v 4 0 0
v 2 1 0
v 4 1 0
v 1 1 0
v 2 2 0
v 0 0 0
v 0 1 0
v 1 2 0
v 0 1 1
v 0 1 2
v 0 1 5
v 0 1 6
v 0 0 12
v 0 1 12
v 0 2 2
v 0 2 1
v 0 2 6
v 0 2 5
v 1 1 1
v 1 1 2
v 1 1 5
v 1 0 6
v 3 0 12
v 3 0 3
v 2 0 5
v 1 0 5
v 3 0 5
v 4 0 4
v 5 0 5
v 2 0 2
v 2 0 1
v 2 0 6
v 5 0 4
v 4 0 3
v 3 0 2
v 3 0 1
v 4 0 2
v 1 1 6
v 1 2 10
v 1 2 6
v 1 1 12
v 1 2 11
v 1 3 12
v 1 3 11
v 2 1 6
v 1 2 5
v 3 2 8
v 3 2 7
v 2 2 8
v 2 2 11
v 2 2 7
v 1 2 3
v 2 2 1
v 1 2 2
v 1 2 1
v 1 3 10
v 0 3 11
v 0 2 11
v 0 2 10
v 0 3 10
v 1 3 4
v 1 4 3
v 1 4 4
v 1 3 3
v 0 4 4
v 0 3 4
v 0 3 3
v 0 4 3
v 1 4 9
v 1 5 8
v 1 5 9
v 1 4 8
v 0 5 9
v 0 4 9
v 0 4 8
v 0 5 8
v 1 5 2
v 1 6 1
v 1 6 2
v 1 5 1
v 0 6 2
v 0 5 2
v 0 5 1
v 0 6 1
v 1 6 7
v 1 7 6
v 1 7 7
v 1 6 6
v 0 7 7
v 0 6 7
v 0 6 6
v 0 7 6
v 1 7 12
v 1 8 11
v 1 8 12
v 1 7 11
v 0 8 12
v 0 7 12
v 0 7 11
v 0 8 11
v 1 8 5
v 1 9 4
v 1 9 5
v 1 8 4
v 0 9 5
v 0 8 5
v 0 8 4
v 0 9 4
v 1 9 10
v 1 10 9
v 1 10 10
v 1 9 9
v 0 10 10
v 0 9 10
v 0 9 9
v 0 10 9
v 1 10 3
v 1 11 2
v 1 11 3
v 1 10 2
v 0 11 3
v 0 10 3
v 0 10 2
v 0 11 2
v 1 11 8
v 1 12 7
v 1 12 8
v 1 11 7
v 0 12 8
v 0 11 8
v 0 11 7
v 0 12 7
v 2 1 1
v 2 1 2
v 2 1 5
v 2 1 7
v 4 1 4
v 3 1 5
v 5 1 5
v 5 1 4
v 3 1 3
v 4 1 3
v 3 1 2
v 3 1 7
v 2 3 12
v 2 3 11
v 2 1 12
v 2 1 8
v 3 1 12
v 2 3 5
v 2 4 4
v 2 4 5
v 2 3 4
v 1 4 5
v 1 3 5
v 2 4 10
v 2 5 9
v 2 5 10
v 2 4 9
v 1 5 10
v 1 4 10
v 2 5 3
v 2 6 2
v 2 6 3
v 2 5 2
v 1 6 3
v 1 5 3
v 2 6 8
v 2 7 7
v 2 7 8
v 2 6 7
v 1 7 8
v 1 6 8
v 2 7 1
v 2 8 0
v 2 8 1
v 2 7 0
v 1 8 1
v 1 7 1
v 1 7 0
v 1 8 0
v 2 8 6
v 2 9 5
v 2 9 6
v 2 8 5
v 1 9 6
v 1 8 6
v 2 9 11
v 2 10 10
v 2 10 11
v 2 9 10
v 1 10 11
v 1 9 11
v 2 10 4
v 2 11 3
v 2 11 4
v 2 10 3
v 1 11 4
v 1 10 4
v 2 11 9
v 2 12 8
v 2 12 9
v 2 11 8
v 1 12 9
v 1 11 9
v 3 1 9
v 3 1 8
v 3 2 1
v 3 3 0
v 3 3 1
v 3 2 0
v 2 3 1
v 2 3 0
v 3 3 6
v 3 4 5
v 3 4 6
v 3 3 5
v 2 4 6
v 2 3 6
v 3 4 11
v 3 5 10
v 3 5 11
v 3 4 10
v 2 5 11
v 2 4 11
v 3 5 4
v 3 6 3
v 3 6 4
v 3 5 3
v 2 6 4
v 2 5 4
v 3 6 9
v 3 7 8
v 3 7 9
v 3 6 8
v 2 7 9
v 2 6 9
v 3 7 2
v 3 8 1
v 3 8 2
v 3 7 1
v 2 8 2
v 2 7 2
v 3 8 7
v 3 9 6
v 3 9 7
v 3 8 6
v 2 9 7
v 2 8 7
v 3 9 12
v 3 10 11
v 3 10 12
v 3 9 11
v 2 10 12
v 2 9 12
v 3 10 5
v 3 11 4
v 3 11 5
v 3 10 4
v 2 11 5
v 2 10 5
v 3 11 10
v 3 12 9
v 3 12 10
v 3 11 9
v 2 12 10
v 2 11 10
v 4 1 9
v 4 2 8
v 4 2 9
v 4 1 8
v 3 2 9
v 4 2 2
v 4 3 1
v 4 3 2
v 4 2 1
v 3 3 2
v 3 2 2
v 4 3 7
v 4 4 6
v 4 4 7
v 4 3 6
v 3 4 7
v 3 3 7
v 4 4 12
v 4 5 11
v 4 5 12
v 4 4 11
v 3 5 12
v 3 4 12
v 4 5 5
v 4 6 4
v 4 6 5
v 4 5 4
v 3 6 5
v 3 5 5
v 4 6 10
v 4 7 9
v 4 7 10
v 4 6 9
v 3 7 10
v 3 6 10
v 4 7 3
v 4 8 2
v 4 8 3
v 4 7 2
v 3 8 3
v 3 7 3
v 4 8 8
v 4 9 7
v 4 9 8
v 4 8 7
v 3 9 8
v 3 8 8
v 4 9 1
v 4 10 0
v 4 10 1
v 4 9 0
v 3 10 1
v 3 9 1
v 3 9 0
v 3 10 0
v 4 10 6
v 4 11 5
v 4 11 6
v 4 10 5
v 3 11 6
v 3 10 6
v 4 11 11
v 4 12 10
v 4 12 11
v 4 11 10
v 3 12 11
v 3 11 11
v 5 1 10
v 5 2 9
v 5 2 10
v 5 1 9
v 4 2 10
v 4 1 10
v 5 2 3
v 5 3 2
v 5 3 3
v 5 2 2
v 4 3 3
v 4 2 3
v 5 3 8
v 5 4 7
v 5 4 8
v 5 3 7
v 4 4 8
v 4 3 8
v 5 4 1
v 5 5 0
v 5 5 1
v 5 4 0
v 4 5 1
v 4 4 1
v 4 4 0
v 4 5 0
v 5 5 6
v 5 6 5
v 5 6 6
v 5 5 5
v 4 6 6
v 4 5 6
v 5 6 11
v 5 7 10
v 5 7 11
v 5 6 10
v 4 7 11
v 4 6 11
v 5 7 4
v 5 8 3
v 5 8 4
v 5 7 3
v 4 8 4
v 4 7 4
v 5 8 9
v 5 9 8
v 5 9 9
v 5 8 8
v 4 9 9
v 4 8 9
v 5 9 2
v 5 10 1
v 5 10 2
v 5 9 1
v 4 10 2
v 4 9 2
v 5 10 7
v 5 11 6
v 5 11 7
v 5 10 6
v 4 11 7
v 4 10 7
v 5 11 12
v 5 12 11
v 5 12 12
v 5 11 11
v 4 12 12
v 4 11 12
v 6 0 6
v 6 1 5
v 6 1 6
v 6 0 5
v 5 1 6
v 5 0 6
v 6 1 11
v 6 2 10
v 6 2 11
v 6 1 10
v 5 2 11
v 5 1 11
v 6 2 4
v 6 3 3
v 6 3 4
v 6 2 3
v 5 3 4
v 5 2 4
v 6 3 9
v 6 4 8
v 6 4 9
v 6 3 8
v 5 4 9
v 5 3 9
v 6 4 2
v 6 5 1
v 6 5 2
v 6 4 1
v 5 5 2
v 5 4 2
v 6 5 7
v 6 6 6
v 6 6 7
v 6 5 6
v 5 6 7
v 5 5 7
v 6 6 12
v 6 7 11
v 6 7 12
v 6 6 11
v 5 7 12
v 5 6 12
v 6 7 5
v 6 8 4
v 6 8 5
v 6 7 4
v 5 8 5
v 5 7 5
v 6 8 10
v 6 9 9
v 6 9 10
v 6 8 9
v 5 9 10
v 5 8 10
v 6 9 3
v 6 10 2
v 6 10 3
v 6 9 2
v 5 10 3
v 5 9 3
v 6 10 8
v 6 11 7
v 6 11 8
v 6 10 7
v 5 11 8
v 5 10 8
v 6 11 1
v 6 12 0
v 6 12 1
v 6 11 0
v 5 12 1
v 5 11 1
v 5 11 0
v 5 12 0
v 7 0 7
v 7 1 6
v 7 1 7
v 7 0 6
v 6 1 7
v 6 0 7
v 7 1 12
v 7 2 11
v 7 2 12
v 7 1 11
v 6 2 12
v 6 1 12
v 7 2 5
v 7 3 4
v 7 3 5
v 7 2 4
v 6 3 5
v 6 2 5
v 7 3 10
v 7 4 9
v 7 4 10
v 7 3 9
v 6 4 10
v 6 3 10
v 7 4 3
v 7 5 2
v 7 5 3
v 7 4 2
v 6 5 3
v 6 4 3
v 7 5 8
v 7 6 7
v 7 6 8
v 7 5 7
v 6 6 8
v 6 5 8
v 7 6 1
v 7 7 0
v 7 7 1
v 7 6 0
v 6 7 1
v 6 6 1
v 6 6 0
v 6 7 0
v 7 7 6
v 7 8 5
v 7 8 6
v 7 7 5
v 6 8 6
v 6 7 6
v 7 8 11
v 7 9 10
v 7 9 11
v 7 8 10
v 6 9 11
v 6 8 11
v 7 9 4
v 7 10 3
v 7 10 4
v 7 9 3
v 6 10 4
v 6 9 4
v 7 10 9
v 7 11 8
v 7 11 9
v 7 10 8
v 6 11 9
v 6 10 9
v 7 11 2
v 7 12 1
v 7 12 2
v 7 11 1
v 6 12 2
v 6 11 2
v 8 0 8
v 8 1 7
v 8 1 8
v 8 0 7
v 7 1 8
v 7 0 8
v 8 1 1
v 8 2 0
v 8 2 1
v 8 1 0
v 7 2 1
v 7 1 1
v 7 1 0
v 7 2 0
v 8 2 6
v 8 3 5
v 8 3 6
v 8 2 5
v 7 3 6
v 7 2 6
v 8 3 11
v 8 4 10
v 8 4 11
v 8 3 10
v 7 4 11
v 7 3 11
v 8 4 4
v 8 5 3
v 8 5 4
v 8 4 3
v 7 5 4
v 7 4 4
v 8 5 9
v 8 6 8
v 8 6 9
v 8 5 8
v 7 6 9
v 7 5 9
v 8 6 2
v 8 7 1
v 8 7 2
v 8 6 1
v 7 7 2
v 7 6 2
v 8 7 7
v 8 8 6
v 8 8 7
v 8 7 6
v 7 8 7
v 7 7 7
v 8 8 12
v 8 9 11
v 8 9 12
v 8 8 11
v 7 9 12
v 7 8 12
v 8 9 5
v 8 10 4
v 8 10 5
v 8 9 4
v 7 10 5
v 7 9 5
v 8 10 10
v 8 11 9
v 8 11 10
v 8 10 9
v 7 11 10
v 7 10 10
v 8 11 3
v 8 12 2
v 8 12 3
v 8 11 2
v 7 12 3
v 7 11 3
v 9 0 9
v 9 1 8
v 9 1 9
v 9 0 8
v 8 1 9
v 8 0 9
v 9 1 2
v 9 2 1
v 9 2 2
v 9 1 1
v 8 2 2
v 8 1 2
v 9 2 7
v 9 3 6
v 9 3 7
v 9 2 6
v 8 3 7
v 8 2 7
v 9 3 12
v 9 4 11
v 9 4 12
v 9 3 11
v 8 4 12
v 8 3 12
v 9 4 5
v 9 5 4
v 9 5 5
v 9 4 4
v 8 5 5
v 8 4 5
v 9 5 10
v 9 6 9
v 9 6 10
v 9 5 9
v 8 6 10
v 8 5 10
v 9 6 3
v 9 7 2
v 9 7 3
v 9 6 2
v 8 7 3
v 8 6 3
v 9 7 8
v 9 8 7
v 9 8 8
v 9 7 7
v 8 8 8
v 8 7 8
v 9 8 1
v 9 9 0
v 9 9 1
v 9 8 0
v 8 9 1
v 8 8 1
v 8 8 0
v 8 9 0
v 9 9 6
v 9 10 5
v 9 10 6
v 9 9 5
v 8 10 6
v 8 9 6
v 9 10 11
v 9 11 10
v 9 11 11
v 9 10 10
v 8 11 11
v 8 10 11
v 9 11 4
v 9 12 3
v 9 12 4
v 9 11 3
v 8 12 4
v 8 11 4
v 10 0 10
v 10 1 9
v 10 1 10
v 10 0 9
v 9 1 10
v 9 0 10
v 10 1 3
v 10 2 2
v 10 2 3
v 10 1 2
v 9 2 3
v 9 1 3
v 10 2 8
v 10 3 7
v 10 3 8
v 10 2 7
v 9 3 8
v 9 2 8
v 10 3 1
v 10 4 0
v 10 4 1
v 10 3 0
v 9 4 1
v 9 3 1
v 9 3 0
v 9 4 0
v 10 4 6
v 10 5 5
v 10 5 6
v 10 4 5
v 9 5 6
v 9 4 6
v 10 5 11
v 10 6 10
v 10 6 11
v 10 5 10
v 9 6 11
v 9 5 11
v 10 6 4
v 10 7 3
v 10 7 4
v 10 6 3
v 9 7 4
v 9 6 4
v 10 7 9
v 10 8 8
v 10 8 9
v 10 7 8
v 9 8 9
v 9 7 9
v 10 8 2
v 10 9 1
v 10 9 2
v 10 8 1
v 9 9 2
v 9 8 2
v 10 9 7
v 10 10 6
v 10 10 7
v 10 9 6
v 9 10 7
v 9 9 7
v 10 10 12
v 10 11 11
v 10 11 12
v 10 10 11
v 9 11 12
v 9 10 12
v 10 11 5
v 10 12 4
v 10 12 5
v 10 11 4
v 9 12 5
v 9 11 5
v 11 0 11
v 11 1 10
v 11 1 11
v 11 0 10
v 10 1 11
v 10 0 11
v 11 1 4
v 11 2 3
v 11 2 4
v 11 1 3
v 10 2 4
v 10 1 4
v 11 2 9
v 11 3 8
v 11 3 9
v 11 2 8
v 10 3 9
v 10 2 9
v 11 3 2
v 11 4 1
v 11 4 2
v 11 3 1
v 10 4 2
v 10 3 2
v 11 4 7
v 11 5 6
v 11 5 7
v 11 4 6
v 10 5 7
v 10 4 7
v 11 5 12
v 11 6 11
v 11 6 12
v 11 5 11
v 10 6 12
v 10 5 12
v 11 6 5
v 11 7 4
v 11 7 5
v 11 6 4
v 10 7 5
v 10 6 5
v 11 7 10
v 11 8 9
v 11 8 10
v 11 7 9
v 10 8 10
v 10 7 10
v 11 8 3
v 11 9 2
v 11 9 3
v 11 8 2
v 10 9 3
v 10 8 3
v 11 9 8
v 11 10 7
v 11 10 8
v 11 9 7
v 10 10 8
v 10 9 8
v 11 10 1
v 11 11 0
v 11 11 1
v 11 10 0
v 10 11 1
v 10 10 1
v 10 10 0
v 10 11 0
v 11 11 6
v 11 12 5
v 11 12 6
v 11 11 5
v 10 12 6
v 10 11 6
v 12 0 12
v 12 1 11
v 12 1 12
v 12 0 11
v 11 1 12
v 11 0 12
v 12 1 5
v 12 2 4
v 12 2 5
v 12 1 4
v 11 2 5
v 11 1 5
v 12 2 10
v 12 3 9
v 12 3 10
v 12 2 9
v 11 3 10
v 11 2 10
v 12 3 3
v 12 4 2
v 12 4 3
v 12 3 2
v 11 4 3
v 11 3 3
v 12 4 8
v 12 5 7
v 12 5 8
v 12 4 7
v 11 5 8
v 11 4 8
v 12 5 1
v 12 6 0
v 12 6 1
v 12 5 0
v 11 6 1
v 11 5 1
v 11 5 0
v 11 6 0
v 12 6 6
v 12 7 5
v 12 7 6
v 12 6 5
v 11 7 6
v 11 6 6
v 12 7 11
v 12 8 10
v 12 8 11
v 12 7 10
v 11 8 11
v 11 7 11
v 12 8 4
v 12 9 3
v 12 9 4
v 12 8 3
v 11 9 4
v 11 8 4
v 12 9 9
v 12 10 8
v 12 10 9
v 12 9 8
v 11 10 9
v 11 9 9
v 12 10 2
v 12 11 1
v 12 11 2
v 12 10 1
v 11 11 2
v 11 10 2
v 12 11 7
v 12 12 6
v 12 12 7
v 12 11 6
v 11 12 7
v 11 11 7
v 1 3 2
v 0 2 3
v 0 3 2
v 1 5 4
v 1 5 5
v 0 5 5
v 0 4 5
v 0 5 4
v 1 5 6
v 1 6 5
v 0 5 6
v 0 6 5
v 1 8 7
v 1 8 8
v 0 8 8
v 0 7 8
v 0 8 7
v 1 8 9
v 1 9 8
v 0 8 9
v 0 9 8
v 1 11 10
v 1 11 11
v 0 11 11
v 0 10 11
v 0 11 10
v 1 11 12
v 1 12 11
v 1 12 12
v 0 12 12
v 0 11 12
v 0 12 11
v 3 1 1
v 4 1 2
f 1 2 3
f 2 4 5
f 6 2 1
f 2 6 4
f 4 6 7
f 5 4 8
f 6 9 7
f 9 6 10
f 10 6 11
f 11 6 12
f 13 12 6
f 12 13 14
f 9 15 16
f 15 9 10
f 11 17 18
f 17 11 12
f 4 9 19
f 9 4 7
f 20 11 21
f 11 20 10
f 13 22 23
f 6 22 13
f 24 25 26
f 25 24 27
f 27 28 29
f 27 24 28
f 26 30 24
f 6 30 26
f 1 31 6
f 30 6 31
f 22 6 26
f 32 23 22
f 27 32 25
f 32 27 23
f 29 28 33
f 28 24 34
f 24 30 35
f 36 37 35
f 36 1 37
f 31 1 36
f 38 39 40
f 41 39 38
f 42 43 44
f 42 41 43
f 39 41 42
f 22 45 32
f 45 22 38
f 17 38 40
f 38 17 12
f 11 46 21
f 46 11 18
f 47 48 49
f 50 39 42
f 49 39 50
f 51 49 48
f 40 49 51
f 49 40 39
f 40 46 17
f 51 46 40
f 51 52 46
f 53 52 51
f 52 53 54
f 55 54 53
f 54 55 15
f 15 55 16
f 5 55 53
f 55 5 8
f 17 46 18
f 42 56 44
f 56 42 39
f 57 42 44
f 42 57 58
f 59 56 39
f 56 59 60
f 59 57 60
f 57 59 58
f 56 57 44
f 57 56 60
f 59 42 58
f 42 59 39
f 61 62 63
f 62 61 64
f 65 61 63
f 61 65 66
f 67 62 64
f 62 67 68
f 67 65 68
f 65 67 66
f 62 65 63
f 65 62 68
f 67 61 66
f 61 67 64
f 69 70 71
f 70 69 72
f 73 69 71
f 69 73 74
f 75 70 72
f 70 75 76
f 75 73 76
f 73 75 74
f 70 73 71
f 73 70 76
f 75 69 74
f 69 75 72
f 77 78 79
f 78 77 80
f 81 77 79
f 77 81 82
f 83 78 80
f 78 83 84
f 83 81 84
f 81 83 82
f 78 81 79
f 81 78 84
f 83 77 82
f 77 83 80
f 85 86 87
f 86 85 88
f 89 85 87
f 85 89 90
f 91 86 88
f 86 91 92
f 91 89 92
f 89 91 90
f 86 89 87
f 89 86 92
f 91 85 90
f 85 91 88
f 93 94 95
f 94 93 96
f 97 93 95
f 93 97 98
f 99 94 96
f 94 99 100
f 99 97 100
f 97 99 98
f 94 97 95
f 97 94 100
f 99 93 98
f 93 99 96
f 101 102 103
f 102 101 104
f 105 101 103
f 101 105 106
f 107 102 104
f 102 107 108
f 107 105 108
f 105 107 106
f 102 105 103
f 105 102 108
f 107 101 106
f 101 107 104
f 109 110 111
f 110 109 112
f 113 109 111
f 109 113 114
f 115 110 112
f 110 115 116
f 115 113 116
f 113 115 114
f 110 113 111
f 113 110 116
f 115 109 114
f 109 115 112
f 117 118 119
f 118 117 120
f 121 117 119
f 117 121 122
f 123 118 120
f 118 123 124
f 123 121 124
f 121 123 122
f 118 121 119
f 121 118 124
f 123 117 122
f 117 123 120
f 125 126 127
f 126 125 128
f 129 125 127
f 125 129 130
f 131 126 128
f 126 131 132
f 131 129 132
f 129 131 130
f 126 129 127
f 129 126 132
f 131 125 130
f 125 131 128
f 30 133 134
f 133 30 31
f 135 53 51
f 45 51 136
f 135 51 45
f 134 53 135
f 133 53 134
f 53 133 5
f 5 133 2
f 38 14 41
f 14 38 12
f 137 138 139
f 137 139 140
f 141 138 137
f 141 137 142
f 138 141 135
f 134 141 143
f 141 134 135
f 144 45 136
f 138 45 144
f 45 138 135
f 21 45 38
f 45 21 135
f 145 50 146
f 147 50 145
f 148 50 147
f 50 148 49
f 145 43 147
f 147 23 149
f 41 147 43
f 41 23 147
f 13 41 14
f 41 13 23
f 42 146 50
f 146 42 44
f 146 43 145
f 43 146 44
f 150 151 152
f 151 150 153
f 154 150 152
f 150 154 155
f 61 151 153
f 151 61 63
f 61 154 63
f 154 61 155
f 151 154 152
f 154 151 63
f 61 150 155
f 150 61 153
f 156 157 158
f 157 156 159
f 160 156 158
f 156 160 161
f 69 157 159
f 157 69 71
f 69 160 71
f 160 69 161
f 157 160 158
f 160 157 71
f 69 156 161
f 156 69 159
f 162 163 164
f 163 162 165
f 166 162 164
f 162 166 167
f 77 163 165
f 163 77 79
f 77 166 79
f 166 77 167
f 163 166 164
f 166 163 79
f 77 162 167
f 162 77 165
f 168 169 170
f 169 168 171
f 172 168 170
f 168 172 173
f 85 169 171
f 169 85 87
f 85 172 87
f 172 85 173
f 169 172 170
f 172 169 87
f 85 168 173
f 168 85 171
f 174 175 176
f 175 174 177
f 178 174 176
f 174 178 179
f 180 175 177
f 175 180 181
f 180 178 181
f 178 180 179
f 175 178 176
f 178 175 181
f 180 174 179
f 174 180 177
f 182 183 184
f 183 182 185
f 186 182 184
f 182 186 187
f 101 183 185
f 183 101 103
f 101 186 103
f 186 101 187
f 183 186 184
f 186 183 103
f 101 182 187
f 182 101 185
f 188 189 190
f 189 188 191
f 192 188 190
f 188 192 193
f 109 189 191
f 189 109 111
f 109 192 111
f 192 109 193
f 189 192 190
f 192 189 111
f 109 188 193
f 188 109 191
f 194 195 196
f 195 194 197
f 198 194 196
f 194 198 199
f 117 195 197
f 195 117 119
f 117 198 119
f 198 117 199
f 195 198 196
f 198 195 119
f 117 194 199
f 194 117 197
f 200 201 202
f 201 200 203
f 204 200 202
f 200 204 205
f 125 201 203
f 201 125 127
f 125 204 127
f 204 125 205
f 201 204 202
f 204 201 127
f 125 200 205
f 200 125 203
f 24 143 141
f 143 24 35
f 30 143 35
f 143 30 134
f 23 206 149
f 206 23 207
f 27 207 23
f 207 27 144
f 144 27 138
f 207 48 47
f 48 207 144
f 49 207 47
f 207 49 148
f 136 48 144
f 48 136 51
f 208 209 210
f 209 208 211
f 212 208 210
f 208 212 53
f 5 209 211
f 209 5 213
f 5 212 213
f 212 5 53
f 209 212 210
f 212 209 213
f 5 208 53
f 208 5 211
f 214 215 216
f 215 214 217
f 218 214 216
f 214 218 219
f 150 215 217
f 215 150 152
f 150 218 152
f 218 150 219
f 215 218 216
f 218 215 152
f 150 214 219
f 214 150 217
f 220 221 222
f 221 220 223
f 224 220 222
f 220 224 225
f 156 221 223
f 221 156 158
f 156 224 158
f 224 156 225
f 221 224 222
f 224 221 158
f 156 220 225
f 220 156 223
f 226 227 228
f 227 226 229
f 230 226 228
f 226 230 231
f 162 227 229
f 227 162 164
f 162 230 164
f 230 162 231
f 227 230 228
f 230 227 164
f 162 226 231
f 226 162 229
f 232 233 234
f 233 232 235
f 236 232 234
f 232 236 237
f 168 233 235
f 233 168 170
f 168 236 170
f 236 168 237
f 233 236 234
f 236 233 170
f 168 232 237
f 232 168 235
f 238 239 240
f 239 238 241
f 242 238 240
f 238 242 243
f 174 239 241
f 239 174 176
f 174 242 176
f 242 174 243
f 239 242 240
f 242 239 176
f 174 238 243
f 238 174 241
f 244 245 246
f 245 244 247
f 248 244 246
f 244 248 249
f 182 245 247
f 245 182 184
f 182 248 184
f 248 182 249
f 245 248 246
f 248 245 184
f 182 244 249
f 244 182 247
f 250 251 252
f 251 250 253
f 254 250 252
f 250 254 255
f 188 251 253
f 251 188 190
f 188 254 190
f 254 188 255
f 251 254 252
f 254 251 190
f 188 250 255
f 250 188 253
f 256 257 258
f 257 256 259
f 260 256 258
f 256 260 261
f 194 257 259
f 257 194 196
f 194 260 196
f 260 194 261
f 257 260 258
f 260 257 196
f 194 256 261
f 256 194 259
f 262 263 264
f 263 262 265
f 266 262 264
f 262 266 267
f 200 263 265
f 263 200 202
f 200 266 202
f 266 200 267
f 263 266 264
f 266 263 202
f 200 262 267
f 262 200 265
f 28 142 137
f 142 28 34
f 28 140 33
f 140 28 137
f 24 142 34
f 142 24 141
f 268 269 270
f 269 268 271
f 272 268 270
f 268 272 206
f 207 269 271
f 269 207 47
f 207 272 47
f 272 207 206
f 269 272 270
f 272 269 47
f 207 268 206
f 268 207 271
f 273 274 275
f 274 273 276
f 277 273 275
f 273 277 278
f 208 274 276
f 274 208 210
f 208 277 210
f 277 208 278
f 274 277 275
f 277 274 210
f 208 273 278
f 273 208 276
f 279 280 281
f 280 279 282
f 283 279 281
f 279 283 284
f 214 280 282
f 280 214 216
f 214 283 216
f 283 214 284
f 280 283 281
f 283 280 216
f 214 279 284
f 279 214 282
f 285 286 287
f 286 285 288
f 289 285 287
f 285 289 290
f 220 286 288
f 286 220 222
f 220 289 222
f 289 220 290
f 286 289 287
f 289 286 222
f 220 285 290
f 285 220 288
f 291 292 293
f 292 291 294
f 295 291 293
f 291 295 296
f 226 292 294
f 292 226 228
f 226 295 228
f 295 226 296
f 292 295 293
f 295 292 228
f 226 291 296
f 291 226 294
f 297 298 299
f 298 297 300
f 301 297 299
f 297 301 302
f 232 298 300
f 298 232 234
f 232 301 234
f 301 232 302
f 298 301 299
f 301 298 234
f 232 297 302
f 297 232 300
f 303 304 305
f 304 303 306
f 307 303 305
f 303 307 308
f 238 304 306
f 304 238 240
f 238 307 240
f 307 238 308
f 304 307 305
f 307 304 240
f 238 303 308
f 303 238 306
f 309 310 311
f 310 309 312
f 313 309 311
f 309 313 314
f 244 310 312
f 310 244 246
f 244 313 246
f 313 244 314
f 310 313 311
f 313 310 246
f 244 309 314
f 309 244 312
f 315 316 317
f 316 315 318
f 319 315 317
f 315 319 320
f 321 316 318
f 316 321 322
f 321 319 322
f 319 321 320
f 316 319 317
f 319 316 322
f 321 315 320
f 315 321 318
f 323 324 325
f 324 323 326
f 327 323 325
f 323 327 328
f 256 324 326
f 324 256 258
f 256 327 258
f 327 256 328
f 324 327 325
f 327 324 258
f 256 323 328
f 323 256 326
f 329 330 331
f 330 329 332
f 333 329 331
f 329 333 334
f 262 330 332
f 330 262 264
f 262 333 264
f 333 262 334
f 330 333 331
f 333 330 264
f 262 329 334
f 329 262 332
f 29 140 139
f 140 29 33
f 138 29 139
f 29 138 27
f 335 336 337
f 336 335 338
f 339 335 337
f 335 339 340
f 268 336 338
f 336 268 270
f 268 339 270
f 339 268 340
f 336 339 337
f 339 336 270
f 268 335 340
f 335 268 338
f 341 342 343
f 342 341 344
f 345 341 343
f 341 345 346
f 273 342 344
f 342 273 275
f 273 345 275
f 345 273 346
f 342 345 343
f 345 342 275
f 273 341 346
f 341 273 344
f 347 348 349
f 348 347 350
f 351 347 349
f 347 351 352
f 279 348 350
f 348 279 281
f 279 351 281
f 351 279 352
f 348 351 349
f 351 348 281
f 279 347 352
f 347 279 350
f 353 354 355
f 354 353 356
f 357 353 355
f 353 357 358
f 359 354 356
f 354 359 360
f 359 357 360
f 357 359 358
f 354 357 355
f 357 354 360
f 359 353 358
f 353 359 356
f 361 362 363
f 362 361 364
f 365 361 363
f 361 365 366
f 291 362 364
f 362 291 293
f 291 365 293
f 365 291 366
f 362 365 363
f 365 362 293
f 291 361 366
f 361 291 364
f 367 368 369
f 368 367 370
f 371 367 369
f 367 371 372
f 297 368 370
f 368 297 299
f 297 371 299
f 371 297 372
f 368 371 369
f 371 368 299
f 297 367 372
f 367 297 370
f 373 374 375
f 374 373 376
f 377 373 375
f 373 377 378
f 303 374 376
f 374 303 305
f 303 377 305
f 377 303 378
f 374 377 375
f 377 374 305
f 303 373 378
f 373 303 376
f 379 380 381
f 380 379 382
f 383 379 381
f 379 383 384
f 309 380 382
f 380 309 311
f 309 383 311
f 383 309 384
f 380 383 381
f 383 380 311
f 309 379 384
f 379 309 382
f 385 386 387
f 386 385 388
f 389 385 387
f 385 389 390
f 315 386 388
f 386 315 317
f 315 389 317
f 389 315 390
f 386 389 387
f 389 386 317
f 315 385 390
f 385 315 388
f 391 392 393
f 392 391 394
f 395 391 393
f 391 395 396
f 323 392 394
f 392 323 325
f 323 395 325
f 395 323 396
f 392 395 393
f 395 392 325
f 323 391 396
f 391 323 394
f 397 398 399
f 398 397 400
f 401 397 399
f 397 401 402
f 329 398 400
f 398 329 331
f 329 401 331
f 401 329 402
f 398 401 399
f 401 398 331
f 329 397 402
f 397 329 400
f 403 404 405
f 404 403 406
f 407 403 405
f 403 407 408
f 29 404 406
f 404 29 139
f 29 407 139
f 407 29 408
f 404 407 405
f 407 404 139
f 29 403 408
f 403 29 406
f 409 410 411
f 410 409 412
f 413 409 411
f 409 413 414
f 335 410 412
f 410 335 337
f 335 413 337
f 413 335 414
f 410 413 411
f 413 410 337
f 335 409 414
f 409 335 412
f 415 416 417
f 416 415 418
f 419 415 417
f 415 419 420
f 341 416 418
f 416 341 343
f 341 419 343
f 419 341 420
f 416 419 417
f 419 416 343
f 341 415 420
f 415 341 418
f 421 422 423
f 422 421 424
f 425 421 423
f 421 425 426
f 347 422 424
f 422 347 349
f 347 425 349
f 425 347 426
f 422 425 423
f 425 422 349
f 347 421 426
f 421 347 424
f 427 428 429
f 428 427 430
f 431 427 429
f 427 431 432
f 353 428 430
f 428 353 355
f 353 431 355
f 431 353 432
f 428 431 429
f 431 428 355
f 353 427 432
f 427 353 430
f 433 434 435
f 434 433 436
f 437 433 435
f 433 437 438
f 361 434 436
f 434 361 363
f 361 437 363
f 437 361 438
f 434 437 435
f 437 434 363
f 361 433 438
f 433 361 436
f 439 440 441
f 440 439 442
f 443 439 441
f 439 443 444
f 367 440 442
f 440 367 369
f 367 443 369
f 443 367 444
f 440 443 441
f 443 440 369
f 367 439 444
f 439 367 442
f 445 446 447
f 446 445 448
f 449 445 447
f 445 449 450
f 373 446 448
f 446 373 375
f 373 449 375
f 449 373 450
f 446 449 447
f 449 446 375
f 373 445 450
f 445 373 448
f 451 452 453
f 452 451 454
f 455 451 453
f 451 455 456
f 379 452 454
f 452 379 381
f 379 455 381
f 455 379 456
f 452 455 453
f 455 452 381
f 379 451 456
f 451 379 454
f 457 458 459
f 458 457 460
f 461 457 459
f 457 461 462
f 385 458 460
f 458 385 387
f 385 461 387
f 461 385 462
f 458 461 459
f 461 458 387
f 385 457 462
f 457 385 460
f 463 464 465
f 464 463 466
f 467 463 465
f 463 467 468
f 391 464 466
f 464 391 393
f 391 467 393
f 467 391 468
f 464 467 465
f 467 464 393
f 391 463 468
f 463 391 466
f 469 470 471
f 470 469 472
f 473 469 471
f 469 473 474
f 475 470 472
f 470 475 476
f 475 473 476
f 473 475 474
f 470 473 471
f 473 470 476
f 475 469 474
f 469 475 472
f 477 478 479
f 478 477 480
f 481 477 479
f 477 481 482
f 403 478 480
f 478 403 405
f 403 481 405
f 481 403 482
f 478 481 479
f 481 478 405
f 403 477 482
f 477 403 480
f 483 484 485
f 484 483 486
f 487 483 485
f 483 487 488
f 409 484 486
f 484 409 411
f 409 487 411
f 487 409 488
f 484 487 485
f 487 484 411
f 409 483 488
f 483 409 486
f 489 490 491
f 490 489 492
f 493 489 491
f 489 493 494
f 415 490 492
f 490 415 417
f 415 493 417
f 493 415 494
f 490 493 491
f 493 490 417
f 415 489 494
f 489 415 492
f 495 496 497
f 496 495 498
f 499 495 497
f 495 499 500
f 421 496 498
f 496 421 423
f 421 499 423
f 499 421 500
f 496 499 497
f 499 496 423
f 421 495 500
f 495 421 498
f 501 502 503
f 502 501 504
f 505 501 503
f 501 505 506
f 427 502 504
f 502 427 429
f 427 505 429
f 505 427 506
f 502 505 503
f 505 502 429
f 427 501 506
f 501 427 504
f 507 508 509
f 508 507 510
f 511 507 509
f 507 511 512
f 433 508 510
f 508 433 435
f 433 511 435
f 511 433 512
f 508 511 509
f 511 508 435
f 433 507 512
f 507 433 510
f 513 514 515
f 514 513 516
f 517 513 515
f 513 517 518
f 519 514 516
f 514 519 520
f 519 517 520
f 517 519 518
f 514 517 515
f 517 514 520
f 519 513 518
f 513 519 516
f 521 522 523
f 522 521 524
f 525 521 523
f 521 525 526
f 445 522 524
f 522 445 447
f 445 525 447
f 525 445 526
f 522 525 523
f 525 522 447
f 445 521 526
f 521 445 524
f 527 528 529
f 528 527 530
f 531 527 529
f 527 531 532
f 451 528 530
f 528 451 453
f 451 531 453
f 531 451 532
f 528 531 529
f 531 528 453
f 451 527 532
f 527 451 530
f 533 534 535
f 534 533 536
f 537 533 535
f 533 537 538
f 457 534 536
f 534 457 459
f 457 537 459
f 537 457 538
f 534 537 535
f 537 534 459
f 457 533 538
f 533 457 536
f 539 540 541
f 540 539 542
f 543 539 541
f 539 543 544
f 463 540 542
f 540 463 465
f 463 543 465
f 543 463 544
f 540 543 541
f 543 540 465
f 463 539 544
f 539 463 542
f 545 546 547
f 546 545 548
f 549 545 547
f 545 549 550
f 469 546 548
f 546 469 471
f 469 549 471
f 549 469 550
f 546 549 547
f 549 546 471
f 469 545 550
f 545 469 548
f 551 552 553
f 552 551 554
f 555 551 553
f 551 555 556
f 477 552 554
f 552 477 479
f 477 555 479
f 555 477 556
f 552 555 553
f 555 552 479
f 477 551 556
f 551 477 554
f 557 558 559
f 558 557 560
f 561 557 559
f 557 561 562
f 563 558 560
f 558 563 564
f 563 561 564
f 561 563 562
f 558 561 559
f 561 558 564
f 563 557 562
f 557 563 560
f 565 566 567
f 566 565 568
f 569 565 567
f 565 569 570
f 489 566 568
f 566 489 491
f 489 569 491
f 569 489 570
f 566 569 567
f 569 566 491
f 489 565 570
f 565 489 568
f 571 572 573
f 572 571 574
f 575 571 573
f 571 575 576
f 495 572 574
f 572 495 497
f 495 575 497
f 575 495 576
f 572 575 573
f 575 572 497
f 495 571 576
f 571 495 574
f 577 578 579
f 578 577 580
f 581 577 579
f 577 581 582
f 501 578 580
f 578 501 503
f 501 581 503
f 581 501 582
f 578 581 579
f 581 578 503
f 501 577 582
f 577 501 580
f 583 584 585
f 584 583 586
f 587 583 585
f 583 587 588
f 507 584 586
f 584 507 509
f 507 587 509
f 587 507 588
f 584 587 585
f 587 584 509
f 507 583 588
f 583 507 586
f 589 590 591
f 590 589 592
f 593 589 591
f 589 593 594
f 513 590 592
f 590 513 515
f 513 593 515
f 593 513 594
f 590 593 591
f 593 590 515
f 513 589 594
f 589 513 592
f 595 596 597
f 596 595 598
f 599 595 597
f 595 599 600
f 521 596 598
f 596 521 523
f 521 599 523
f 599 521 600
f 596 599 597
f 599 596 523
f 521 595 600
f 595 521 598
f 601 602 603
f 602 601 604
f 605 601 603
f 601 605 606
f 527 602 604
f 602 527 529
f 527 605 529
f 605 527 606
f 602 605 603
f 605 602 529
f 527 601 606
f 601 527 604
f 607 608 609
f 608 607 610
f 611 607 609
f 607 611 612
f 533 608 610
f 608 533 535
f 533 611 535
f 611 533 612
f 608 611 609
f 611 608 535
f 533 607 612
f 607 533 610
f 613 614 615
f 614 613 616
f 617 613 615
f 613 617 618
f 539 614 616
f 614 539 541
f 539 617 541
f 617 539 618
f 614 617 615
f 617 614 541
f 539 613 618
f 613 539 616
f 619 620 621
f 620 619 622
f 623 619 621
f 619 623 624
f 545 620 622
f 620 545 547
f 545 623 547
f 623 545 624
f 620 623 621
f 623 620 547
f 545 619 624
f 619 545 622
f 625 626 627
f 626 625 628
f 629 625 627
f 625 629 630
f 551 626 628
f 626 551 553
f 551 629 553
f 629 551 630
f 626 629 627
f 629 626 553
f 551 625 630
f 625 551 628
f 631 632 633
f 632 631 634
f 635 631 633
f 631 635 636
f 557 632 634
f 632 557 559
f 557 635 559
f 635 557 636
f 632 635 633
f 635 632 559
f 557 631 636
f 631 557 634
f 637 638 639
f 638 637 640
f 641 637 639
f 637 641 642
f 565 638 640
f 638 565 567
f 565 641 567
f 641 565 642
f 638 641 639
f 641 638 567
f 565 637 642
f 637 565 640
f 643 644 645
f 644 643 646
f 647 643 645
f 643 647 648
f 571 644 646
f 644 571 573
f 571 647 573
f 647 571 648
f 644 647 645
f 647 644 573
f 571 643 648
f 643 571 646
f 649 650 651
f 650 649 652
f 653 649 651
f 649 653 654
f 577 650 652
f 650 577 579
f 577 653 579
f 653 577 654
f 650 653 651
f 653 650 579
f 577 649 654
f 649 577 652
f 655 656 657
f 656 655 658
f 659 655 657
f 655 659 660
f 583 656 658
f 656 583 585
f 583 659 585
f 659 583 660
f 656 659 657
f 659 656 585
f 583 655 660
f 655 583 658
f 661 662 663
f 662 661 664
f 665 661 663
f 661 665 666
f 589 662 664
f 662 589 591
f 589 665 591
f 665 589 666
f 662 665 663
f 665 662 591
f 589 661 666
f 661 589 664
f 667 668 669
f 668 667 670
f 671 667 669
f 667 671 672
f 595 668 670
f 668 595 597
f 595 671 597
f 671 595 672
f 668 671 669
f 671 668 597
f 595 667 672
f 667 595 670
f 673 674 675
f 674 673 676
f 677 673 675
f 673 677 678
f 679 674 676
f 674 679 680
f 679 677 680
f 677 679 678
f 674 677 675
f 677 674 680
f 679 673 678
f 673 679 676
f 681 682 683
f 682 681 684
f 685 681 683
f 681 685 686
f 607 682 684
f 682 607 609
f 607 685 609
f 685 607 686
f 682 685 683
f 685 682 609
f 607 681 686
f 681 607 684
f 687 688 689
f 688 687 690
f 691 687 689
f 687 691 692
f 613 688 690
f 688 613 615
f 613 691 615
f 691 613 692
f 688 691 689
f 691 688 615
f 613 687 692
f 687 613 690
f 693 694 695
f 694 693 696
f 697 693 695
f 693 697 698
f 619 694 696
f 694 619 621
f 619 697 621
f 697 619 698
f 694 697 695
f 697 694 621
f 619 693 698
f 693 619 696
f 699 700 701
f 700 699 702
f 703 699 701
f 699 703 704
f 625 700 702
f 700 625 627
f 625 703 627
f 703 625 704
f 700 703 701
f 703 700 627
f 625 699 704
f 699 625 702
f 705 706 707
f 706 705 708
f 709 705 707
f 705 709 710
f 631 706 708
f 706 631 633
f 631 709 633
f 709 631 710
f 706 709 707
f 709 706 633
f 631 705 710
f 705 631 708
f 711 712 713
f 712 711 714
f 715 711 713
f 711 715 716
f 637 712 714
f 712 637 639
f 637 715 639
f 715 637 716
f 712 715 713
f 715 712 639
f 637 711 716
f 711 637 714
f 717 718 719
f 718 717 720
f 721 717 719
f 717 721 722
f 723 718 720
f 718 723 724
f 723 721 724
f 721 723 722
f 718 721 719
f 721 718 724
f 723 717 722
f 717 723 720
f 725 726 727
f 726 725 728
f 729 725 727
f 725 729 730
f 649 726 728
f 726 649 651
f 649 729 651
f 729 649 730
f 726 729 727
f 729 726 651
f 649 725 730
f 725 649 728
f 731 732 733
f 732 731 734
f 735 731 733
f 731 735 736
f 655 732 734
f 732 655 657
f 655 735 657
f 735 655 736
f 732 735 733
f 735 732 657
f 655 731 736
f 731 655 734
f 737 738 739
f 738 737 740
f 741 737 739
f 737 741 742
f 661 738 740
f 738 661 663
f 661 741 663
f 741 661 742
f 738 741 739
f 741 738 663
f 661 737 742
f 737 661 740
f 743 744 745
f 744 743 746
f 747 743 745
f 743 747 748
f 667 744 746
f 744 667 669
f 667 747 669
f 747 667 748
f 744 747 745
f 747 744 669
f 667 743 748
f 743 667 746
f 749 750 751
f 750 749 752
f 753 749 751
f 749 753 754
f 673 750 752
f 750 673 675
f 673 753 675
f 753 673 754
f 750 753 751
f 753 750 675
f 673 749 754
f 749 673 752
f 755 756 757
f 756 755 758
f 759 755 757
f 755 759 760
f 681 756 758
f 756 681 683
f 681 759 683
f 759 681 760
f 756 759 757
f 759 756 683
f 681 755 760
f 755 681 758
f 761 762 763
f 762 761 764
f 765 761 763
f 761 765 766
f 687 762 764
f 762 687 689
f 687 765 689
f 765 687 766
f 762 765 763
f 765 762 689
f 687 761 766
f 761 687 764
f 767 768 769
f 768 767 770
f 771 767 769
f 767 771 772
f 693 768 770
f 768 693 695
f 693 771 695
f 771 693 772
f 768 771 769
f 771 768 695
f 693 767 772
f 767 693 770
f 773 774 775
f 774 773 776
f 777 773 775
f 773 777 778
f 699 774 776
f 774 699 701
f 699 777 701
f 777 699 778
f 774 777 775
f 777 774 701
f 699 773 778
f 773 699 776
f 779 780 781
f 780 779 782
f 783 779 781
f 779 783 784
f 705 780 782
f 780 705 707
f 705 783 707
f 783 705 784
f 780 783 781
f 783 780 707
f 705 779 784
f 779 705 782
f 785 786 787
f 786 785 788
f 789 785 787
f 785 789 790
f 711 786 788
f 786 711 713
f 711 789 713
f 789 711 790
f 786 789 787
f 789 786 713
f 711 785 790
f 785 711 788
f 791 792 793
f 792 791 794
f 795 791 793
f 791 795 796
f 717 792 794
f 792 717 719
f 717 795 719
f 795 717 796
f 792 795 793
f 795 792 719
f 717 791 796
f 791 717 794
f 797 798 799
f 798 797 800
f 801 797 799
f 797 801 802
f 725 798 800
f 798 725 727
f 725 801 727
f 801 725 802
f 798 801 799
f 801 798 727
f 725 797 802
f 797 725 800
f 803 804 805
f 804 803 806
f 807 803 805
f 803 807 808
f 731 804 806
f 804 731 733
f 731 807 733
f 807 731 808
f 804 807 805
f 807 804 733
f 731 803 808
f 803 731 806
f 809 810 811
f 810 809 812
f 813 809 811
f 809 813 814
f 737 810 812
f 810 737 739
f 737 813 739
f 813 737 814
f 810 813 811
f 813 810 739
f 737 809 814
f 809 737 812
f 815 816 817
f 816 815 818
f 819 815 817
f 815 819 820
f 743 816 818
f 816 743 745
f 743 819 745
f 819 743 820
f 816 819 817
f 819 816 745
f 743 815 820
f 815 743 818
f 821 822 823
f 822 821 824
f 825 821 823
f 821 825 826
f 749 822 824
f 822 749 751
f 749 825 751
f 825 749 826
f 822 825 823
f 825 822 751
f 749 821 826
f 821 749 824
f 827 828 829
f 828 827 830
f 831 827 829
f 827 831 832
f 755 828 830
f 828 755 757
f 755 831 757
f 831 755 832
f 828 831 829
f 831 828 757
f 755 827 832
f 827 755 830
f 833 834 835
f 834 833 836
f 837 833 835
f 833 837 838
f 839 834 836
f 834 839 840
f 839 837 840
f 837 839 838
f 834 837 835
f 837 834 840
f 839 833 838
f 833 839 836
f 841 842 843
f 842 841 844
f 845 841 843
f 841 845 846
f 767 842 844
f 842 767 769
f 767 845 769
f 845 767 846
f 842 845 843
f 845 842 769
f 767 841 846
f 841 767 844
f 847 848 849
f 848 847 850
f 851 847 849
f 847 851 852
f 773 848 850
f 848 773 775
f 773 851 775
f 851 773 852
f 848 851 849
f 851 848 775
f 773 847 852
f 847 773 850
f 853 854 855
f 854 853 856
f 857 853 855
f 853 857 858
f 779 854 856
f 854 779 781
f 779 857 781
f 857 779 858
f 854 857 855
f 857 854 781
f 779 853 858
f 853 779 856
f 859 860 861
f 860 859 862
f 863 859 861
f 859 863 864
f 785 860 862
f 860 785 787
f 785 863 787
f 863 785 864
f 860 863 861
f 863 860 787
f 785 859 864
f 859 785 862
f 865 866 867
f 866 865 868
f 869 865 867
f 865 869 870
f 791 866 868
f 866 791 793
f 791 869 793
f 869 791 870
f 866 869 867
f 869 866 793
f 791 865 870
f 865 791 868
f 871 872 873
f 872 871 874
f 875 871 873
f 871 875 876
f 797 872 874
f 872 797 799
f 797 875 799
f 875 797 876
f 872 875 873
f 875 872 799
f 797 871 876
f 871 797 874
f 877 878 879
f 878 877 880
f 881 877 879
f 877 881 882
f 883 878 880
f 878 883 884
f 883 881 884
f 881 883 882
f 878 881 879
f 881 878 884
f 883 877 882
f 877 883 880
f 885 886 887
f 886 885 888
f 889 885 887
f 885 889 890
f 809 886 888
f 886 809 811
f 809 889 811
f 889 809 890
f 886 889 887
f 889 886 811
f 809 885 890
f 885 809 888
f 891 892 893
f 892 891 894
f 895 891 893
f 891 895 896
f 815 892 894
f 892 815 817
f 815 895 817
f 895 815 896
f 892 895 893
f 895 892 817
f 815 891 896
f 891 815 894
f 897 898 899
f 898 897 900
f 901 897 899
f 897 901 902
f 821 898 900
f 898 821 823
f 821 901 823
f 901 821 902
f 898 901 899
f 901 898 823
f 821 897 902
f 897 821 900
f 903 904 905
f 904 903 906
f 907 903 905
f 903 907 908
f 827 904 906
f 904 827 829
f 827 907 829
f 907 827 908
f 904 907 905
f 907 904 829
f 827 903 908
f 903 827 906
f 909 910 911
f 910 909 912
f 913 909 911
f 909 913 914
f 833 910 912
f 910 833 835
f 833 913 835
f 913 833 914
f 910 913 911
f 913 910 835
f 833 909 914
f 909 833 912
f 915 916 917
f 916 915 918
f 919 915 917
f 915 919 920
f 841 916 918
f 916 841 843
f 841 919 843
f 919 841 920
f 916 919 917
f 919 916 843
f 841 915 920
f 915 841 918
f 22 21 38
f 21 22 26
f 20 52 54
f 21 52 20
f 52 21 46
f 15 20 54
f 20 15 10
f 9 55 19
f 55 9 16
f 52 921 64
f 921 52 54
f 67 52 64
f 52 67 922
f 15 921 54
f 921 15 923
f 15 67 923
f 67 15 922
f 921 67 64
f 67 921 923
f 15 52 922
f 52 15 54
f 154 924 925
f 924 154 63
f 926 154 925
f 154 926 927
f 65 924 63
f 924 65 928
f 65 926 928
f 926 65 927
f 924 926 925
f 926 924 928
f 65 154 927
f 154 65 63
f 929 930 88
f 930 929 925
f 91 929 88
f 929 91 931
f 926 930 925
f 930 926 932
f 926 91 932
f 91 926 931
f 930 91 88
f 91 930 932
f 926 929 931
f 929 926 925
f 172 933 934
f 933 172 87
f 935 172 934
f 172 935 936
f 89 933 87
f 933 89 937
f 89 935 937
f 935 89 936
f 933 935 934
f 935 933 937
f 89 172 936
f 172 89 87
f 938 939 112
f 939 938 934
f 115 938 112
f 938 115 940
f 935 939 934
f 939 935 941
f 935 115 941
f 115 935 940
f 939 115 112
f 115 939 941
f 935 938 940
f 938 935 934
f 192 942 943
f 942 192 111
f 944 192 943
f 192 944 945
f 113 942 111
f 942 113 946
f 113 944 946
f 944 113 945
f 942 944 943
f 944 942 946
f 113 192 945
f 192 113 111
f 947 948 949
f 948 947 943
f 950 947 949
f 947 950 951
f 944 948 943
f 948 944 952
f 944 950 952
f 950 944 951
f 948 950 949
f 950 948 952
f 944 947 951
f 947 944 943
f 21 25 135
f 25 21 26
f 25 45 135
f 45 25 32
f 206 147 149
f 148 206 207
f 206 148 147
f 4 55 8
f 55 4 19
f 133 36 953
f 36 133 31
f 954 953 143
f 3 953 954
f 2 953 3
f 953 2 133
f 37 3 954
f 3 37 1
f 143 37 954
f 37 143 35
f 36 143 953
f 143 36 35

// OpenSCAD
union() {
    translate([0, 0, 0]) cube([1, 1, 1]);
    translate([0, 1, 5]) cube([1, 1, 1]);
    translate([0, 2, 10]) cube([1, 1, 1]);
    translate([0, 3, 3]) cube([1, 1, 1]);
    translate([0, 4, 8]) cube([1, 1, 1]);
    translate([0, 5, 1]) cube([1, 1, 1]);
    translate([0, 6, 6]) cube([1, 1, 1]);
    translate([0, 7, 11]) cube([1, 1, 1]);
    translate([0, 8, 4]) cube([1, 1, 1]);
    translate([0, 9, 9]) cube([1, 1, 1]);
    translate([0, 10, 2]) cube([1, 1, 1]);
    translate([0, 11, 7]) cube([1, 1, 1]);
    translate([1, 0, 1]) cube([1, 1, 1]);
    translate([1, 1, 6]) cube([1, 1, 1]);
    translate([1, 2, 11]) cube([1, 1, 1]);
    translate([1, 3, 4]) cube([1, 1, 1]);
    translate([1, 4, 9]) cube([1, 1, 1]);
    translate([1, 5, 2]) cube([1, 1, 1]);
    translate([1, 6, 7]) cube([1, 1, 1]);
    translate([1, 7, 0]) cube([1, 1, 1]);
    translate([1, 8, 5]) cube([1, 1, 1]);
    translate([1, 9, 10]) cube([1, 1, 1]);
    translate([1, 10, 3]) cube([1, 1, 1]);
    translate([1, 11, 8]) cube([1, 1, 1]);
    translate([2, 0, 2]) cube([1, 1, 1]);
    translate([2, 1, 7]) cube([1, 1, 1]);
    translate([2, 2, 0]) cube([1, 1, 1]);
    translate([2, 3, 5]) cube([1, 1, 1]);
    translate([2, 4, 10]) cube([1, 1, 1]);
    translate([2, 5, 3]) cube([1, 1, 1]);
    translate([2, 6, 8]) cube([1, 1, 1]);
    translate([2, 7, 1]) cube([1, 1, 1]);
    translate([2, 8, 6]) cube([1, 1, 1]);
    translate([2, 9, 11]) cube([1, 1, 1]);
    translate([2, 10, 4]) cube([1, 1, 1]);
    translate([2, 11, 9]) cube([1, 1, 1]);
    translate([3, 0, 3]) cube([1, 1, 1]);
    translate([3, 1, 8]) cube([1, 1, 1]);
    translate([3, 2, 1]) cube([1, 1, 1]);
    translate([3, 3, 6]) cube([1, 1, 1]);
    translate([3, 4, 11]) cube([1, 1, 1]);
    translate([3, 5, 4]) cube([1, 1, 1]);
    translate([3, 6, 9]) cube([1, 1, 1]);
    translate([3, 7, 2]) cube([1, 1, 1]);
    translate([3, 8, 7]) cube([1, 1, 1]);
    translate([3, 9, 0]) cube([1, 1, 1]);
    translate([3, 10, 5]) cube([1, 1, 1]);
    translate([3, 11, 10]) cube([1, 1, 1]);
    translate([4, 0, 4]) cube([1, 1, 1]);
    translate([4, 1, 9]) cube([1, 1, 1]);
    translate([4, 2, 2]) cube([1, 1, 1]);
    translate([4, 3, 7]) cube([1, 1, 1]);
    translate([4, 4, 0]) cube([1, 1, 1]);
    translate([4, 5, 5]) cube([1, 1, 1]);
    translate([4, 6, 10]) cube([1, 1, 1]);
    translate([4, 7, 3]) cube([1, 1, 1]);
    translate([4, 8, 8]) cube([1, 1, 1]);
    translate([4, 9, 1]) cube([1, 1, 1]);
    translate([4, 10, 6]) cube([1, 1, 1]);
    translate([4, 11, 11]) cube([1, 1, 1]);
    translate([5, 0, 5]) cube([1, 1, 1]);
    translate([5, 1, 10]) cube([1, 1, 1]);
    translate([5, 2, 3]) cube([1, 1, 1]);
    translate([5, 3, 8]) cube([1, 1, 1]);
    translate([5, 4, 1]) cube([1, 1, 1]);
    translate([5, 5, 6]) cube([1, 1, 1]);
    translate([5, 6, 11]) cube([1, 1, 1]);
    translate([5, 7, 4]) cube([1, 1, 1]);
    translate([5, 8, 9]) cube([1, 1, 1]);
    translate([5, 9, 2]) cube([1, 1, 1]);
    translate([5, 10, 7]) cube([1, 1, 1]);
    translate([5, 11, 0]) cube([1, 1, 1]);
    translate([6, 0, 6]) cube([1, 1, 1]);
    translate([6, 1, 11]) cube([1, 1, 1]);
    translate([6, 2, 4]) cube([1, 1, 1]);
    translate([6, 3, 9]) cube([1, 1, 1]);
    translate([6, 4, 2]) cube([1, 1, 1]);
    translate([6, 5, 7]) cube([1, 1, 1]);
    translate([6, 6, 0]) cube([1, 1, 1]);
    translate([6, 7, 5]) cube([1, 1, 1]);
    translate([6, 8, 10]) cube([1, 1, 1]);
    translate([6, 9, 3]) cube([1, 1, 1]);
    translate([6, 10, 8]) cube([1, 1, 1]);
    translate([6, 11, 1]) cube([1, 1, 1]);
    translate([7, 0, 7]) cube([1, 1, 1]);
    translate([7, 1, 0]) cube([1, 1, 1]);
    translate([7, 2, 5]) cube([1, 1, 1]);
    translate([7, 3, 10]) cube([1, 1, 1]);
    translate([7, 4, 3]) cube([1, 1, 1]);
    translate([7, 5, 8]) cube([1, 1, 1]);
    translate([7, 6, 1]) cube([1, 1, 1]);
    translate([7, 7, 6]) cube([1, 1, 1]);
    translate([7, 8, 11]) cube([1, 1, 1]);
    translate([7, 9, 4]) cube([1, 1, 1]);
    translate([7, 10, 9]) cube([1, 1, 1]);
    translate([7, 11, 2]) cube([1, 1, 1]);
    translate([8, 0, 8]) cube([1, 1, 1]);
    translate([8, 1, 1]) cube([1, 1, 1]);
    translate([8, 2, 6]) cube([1, 1, 1]);
    translate([8, 3, 11]) cube([1, 1, 1]);
    translate([8, 4, 4]) cube([1, 1, 1]);
    translate([8, 5, 9]) cube([1, 1, 1]);
    translate([8, 6, 2]) cube([1, 1, 1]);
    translate([8, 7, 7]) cube([1, 1, 1]);
    translate([8, 8, 0]) cube([1, 1, 1]);
    translate([8, 9, 5]) cube([1, 1, 1]);
    translate([8, 10, 10]) cube([1, 1, 1]);
    translate([8, 11, 3]) cube([1, 1, 1]);
    translate([9, 0, 9]) cube([1, 1, 1]);
    translate([9, 1, 2]) cube([1, 1, 1]);
    translate([9, 2, 7]) cube([1, 1, 1]);
    translate([9, 3, 0]) cube([1, 1, 1]);
    translate([9, 4, 5]) cube([1, 1, 1]);
    translate([9, 5, 10]) cube([1, 1, 1]);
    translate([9, 6, 3]) cube([1, 1, 1]);
    translate([9, 7, 8]) cube([1, 1, 1]);
    translate([9, 8, 1]) cube([1, 1, 1]);
    translate([9, 9, 6]) cube([1, 1, 1]);
    translate([9, 10, 11]) cube([1, 1, 1]);
    translate([9, 11, 4]) cube([1, 1, 1]);
    translate([10, 0, 10]) cube([1, 1, 1]);
    translate([10, 1, 3]) cube([1, 1, 1]);
    translate([10, 2, 8]) cube([1, 1, 1]);
    translate([10, 3, 1]) cube([1, 1, 1]);
    translate([10, 4, 6]) cube([1, 1, 1]);
    translate([10, 5, 11]) cube([1, 1, 1]);
    translate([10, 6, 4]) cube([1, 1, 1]);
    translate([10, 7, 9]) cube([1, 1, 1]);
    translate([10, 8, 2]) cube([1, 1, 1]);
    translate([10, 9, 7]) cube([1, 1, 1]);
    translate([10, 10, 0]) cube([1, 1, 1]);
    translate([10, 11, 5]) cube([1, 1, 1]);
    translate([11, 0, 11]) cube([1, 1, 1]);
    translate([11, 1, 4]) cube([1, 1, 1]);
    translate([11, 2, 9]) cube([1, 1, 1]);
    translate([11, 3, 2]) cube([1, 1, 1]);
    translate([11, 4, 7]) cube([1, 1, 1]);
    translate([11, 5, 0]) cube([1, 1, 1]);
    translate([11, 6, 5]) cube([1, 1, 1]);
    translate([11, 7, 10]) cube([1, 1, 1]);
    translate([11, 8, 3]) cube([1, 1, 1]);
    translate([11, 9, 8]) cube([1, 1, 1]);
    translate([11, 10, 1]) cube([1, 1, 1]);
    translate([11, 11, 6]) cube([1, 1, 1]);
    translate([0, 0, 1]) cube([1, 1, 1]);
    translate([0, 0, 2]) cube([1, 1, 1]);
    translate([0, 0, 3]) cube([1, 1, 1]);
    translate([0, 0, 4]) cube([1, 1, 1]);
    translate([0, 0, 5]) cube([1, 1, 1]);
    translate([0, 0, 6]) cube([1, 1, 1]);
    translate([0, 0, 7]) cube([1, 1, 1]);
    translate([0, 0, 8]) cube([1, 1, 1]);
    translate([0, 0, 9]) cube([1, 1, 1]);
    translate([0, 0, 10]) cube([1, 1, 1]);
    translate([0, 0, 11]) cube([1, 1, 1]);
    translate([0, 1, 1]) cube([1, 1, 1]);
    translate([0, 2, 2]) cube([1, 1, 1]);
    translate([0, 3, 3]) cube([1, 1, 1]);
    translate([0, 4, 4]) cube([1, 1, 1]);
    translate([0, 5, 5]) cube([1, 1, 1]);
    translate([0, 6, 6]) cube([1, 1, 1]);
    translate([0, 7, 7]) cube([1, 1, 1]);
    translate([0, 8, 8]) cube([1, 1, 1]);
    translate([0, 9, 9]) cube([1, 1, 1]);
    translate([0, 10, 10]) cube([1, 1, 1]);
    translate([0, 11, 11]) cube([1, 1, 1]);
    translate([1, 0, 0]) cube([1, 1, 1]);
    translate([1, 0, 2]) cube([1, 1, 1]);
    translate([1, 0, 3]) cube([1, 1, 1]);
    translate([1, 0, 4]) cube([1, 1, 1]);
    translate([1, 0, 6]) cube([1, 1, 1]);
    translate([1, 0, 7]) cube([1, 1, 1]);
    translate([1, 0, 8]) cube([1, 1, 1]);
    translate([1, 0, 9]) cube([1, 1, 1]);
    translate([1, 0, 10]) cube([1, 1, 1]);
    translate([1, 0, 11]) cube([1, 1, 1]);
    translate([1, 1, 0]) cube([1, 1, 1]);
    translate([1, 1, 1]) cube([1, 1, 1]);
    translate([1, 1, 2]) cube([1, 1, 1]);
    translate([1, 1, 3]) cube([1, 1, 1]);
    translate([1, 1, 4]) cube([1, 1, 1]);
    translate([1, 1, 5]) cube([1, 1, 1]);
    translate([1, 1, 7]) cube([1, 1, 1]);
    translate([1, 1, 8]) cube([1, 1, 1]);
    translate([1, 1, 9]) cube([1, 1, 1]);
    translate([1, 1, 10]) cube([1, 1, 1]);
    translate([1, 1, 11]) cube([1, 1, 1]);
    translate([2, 0, 0]) cube([1, 1, 1]);
    translate([2, 0, 3]) cube([1, 1, 1]);
    translate([2, 0, 4]) cube([1, 1, 1]);
    translate([2, 0, 5]) cube([1, 1, 1]);
    translate([2, 0, 6]) cube([1, 1, 1]);
    translate([2, 0, 7]) cube([1, 1, 1]);
    translate([2, 0, 8]) cube([1, 1, 1]);
    translate([2, 0, 9]) cube([1, 1, 1]);
    translate([2, 0, 10]) cube([1, 1, 1]);
    translate([2, 0, 11]) cube([1, 1, 1]);
    translate([3, 0, 0]) cube([1, 1, 1]);
    translate([3, 0, 1]) cube([1, 1, 1]);
    translate([3, 0, 4]) cube([1, 1, 1]);
}
